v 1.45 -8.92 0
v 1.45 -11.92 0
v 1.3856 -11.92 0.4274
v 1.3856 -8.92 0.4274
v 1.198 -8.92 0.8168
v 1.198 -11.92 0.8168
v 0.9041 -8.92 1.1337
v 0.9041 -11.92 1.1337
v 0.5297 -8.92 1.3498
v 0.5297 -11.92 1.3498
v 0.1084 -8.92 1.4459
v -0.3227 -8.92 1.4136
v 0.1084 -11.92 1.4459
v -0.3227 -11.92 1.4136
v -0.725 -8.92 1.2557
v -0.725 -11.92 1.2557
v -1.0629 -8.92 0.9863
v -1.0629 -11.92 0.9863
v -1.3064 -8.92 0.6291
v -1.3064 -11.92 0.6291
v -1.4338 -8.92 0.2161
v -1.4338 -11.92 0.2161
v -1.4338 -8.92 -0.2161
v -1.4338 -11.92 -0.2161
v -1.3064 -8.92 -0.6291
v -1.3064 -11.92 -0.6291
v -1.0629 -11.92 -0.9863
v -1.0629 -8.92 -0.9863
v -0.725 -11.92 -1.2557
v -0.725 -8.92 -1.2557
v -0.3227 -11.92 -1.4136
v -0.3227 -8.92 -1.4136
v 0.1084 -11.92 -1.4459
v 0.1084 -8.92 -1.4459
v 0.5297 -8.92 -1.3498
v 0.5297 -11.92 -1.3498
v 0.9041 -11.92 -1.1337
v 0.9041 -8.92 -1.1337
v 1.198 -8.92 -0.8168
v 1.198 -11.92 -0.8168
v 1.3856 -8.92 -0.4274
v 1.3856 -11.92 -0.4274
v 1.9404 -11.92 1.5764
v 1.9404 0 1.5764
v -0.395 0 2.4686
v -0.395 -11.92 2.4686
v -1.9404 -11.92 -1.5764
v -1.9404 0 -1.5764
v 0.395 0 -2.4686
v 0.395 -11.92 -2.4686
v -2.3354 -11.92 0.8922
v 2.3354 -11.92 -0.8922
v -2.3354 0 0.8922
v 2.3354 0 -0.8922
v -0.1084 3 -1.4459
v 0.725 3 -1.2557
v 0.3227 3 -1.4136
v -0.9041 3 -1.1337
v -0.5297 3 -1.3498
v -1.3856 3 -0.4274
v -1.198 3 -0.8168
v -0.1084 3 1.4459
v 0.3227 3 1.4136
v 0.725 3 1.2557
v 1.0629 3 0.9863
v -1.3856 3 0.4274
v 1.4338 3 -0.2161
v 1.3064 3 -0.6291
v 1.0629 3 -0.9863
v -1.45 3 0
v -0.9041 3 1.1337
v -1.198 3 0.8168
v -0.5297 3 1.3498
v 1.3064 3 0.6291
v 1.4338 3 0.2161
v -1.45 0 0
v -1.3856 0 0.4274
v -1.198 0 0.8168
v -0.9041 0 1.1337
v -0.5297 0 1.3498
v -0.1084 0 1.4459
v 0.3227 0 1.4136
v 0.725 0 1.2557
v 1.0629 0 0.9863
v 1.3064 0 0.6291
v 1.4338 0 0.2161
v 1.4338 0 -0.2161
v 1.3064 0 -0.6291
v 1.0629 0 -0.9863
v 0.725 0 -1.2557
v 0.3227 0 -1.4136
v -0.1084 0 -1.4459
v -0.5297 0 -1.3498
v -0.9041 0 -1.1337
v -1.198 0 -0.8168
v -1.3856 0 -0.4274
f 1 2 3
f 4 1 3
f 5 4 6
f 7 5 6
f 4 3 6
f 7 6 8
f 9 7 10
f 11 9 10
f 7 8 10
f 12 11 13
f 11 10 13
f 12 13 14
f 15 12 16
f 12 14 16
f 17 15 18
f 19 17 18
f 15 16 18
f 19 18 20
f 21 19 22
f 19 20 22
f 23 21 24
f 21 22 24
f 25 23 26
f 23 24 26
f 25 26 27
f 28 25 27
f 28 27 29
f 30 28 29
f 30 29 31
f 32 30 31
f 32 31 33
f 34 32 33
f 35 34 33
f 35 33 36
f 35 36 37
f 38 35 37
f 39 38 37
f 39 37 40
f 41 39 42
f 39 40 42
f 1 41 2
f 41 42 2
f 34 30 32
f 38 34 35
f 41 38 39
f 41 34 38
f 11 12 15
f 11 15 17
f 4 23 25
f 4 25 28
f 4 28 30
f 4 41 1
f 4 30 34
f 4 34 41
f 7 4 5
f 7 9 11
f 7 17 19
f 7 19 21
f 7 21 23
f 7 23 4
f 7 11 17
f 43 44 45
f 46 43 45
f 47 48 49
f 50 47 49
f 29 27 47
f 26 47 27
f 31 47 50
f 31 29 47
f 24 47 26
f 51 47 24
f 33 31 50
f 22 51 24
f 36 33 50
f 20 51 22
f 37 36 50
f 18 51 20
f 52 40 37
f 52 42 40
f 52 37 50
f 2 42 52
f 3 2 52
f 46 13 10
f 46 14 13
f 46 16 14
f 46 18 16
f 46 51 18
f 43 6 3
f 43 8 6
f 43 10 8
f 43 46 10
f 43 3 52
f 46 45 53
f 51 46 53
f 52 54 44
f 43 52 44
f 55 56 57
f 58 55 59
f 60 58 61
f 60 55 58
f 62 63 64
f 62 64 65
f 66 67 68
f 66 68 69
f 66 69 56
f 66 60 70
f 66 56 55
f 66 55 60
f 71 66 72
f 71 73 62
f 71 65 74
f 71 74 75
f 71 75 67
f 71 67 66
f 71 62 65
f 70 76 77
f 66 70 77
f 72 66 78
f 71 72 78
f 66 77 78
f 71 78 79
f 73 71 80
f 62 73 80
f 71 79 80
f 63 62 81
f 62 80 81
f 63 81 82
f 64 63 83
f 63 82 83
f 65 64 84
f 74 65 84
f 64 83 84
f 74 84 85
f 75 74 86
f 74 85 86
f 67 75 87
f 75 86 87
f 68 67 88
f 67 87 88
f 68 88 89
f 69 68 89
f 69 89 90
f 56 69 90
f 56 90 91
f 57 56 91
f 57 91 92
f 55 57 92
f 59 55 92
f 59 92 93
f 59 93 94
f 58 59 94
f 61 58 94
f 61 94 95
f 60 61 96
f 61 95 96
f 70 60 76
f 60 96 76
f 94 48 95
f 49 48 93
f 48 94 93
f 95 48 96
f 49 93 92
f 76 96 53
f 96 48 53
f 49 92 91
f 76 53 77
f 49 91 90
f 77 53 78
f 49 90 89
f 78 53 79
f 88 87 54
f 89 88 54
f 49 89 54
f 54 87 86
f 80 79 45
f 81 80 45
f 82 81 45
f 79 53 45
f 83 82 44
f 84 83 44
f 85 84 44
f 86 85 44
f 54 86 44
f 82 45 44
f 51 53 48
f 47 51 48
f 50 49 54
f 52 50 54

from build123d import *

# Parameters (mm, degrees)
F1_DEPTH = 11.92
F2_R     = 1.45
F3_DEPTH = 3
F4_R     = 1.45
F5_DEPTH = 3


with BuildPart() as f1:
    # F0 (on Front) → F1 (new body)
    with BuildSketch(Plane.XZ):
        Polygon((2.335372, -0.892208), (1.940361, 1.576388), (-0.395011, 2.468596), (-2.335372, 0.892208), (-1.940361, -1.576388), (0.395011, -2.468596), align=None)
    extrude(amount=F1_DEPTH)

    # F2 (on face) → F3 (join)
    with BuildSketch(Plane(origin=(0, 0, 0), x_dir=(-1, 0, 0), z_dir=(0, 1, 0))):
        Circle(F2_R)
    extrude(amount=F3_DEPTH)

    # F4 (on face) → F5 (cut)
    with BuildSketch(Plane.XZ.offset(11.92)):
        Circle(F4_R)
    extrude(amount=-F5_DEPTH, mode=Mode.SUBTRACT)


solid = f1.part
